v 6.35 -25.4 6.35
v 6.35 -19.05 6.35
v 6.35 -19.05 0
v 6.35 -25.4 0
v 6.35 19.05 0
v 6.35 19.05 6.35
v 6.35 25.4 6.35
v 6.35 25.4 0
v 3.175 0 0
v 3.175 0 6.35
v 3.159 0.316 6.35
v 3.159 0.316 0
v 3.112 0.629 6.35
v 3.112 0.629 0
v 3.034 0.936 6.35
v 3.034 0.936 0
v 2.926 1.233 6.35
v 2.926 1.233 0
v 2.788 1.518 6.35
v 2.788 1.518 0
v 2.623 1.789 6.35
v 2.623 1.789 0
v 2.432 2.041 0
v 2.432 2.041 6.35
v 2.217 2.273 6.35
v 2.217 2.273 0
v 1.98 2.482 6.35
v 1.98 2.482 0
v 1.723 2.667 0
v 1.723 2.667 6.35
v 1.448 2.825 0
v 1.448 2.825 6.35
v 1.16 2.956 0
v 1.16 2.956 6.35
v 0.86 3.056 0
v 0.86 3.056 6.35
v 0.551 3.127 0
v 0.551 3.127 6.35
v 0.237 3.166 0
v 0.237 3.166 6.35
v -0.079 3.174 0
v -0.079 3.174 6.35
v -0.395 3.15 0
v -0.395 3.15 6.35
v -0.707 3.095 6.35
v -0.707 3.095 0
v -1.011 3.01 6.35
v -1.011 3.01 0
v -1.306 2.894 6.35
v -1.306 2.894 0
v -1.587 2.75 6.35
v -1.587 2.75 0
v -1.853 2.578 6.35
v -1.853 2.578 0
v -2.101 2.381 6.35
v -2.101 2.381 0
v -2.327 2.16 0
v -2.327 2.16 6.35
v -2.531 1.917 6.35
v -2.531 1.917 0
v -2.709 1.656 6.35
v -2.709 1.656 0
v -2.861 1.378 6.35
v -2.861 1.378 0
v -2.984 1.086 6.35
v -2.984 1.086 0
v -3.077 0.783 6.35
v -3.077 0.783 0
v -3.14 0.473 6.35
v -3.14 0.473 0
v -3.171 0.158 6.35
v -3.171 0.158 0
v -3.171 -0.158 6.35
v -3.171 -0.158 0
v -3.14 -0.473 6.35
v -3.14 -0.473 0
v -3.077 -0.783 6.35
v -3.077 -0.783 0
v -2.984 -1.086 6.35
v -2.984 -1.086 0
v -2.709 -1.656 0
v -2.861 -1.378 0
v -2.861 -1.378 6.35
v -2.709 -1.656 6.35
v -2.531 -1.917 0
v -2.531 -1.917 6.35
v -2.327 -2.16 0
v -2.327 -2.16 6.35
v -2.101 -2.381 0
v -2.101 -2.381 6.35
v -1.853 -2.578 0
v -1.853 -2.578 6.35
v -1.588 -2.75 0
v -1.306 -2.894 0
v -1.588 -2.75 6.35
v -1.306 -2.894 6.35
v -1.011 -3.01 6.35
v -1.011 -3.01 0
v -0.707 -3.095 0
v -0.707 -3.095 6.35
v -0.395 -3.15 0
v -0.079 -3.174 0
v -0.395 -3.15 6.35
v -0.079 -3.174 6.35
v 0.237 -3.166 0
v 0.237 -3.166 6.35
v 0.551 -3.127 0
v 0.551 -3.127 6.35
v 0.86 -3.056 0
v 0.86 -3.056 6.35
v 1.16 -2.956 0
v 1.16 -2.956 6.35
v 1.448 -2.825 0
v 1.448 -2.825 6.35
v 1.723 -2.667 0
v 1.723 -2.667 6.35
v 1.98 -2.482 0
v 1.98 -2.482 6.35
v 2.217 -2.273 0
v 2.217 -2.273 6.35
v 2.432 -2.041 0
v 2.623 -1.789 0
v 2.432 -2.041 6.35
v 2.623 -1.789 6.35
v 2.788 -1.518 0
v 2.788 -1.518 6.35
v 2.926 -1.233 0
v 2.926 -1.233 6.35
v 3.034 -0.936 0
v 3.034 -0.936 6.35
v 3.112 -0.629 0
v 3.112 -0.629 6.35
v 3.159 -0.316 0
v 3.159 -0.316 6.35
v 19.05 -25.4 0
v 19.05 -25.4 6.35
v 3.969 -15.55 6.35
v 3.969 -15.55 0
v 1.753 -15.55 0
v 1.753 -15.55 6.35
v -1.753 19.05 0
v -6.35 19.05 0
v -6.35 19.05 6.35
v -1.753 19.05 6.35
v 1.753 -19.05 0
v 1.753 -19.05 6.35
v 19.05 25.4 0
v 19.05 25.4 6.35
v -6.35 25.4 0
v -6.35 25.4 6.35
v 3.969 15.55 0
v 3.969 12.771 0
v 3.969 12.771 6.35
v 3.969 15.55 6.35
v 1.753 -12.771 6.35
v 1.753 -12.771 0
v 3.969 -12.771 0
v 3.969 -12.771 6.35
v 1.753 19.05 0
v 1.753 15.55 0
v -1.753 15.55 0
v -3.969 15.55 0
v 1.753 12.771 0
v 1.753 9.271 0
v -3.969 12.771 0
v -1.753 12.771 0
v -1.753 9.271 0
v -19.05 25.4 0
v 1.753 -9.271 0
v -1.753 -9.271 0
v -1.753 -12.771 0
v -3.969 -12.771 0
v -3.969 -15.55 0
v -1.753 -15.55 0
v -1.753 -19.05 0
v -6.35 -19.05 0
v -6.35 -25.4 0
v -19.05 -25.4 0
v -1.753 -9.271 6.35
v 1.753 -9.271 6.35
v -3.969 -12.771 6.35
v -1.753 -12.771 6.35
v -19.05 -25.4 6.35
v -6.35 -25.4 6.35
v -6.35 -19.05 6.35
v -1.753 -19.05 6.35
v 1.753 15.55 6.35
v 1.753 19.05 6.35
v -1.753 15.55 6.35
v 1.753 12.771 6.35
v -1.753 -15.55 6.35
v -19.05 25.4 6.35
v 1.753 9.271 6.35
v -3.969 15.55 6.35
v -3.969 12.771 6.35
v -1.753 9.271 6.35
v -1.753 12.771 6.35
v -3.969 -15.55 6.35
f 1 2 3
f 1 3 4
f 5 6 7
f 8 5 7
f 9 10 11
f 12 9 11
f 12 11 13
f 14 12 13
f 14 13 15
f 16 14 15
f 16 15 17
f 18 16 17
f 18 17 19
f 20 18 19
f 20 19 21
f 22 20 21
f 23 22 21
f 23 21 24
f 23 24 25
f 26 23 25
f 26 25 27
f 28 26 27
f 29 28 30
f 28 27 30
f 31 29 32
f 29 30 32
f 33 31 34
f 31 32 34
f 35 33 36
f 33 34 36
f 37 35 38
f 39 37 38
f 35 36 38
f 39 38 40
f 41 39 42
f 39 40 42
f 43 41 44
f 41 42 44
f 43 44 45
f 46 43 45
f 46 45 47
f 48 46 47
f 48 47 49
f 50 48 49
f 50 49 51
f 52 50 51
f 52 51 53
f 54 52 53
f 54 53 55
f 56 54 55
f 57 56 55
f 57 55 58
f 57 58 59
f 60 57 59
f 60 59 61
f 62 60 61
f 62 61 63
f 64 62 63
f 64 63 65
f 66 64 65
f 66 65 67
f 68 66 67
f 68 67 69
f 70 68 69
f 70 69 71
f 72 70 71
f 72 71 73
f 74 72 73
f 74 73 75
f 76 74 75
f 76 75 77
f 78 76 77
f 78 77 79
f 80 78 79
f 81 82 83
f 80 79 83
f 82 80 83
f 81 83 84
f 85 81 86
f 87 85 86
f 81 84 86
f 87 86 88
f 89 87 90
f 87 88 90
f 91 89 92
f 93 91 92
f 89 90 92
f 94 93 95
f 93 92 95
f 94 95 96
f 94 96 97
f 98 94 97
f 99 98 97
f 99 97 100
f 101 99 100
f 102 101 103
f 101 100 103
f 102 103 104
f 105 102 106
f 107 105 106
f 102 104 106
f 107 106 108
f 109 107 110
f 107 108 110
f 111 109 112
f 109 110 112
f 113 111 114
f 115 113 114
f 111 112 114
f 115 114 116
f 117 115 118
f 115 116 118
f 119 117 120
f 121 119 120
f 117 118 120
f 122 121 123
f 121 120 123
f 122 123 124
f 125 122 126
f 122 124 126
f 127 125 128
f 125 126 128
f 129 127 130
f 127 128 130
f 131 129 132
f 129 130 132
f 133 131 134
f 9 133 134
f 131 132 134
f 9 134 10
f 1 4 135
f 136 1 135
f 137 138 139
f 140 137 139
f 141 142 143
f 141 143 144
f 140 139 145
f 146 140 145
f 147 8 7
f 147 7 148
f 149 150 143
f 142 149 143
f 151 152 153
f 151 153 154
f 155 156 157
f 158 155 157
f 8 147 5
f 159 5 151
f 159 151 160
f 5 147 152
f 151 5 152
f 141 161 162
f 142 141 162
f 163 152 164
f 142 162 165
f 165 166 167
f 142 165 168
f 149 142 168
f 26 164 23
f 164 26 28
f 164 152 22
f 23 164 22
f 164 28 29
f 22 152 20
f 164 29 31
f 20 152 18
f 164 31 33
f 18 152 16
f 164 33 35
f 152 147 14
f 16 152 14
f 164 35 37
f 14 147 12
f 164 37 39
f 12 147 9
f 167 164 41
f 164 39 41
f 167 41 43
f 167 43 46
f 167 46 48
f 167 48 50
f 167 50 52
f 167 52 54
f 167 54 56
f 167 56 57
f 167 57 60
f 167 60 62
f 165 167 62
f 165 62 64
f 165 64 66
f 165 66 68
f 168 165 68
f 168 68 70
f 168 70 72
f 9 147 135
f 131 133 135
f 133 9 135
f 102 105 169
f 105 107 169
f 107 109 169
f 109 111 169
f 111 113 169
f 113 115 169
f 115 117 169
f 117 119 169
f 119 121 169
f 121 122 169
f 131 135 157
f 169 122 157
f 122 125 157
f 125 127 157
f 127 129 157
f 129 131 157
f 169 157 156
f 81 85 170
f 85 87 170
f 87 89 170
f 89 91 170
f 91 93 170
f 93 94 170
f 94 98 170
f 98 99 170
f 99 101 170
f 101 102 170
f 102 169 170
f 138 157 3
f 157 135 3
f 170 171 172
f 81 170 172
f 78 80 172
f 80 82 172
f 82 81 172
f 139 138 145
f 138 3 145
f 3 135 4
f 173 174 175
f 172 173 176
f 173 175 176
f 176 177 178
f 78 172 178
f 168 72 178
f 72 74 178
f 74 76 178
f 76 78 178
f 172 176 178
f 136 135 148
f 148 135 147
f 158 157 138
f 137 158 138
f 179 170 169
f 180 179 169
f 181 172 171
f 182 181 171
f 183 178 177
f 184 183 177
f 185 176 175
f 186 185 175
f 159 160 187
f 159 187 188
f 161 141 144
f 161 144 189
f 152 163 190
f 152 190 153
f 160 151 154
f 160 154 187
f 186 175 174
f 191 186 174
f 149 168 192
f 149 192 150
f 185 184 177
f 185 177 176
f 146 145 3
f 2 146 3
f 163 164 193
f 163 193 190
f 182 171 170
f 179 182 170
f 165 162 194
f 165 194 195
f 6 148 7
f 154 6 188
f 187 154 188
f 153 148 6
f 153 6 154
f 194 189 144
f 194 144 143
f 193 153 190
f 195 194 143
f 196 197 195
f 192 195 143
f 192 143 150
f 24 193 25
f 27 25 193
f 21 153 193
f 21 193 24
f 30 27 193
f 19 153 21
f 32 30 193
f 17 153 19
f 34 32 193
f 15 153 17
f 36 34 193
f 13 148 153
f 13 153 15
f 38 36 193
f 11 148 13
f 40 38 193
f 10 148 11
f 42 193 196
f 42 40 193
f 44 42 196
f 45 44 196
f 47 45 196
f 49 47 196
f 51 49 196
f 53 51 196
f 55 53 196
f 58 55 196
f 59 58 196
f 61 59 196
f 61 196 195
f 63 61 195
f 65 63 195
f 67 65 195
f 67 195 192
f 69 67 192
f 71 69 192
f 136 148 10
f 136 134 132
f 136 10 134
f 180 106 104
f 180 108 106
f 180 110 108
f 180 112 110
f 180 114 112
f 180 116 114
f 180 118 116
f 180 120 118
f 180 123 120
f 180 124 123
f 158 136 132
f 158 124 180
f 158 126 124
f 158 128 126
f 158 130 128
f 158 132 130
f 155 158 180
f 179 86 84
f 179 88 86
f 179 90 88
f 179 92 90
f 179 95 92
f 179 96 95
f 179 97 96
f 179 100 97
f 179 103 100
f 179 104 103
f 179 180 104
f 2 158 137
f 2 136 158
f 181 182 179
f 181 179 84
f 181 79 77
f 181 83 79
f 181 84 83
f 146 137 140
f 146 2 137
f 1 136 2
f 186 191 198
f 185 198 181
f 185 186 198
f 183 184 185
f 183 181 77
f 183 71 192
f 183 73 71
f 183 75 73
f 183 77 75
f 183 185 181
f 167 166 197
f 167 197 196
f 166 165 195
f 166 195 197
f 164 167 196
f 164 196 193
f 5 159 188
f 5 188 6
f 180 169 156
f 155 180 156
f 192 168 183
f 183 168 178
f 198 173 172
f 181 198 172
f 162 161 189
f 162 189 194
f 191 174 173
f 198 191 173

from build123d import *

# Parameters (mm, degrees)
BOSS_EXTRUDE1_DEPTH = 6.35
SKETCH3_R           = 3.175
CUT_EXTRUDE1_DEPTH  = 33.378773911


with BuildPart() as part:
    # Sketch2 → Boss-Extrude1 (new body)
    with BuildSketch(Plane.XY):
        Polygon((-19.05, 0), (-19.05, 25.4), (-6.35, 25.4), (-6.35, 19.05), (-1.7526, 19.05), (-1.7526, 15.5495625), (-3.96875, 15.5495625), (-3.96875, 12.7714375), (-1.7526, 12.7714375), (-1.7526, 9.271), (1.7526, 9.271), (1.7526, 12.7714375), (3.96875, 12.7714375), (3.96875, 15.5495625), (1.7526, 15.5495625), (1.7526, 19.05), (6.35, 19.05), (6.35, 25.4), (19.05, 25.4), (19.05, 0), align=None)
    boss_extrude1 = extrude(amount=BOSS_EXTRUDE1_DEPTH)

    # Mirror1: Boss-Extrude1 across plane
    add(boss_extrude1.mirror(Plane(origin=(-19.05, 0, 6.35), x_dir=(0, 0, 1), z_dir=(0, 1, 0))))

    # Sketch3 → Cut-Extrude1 (cut, through all)
    with BuildSketch(Plane.XY.offset(6.35)):
        Circle(SKETCH3_R)
    extrude(amount=-CUT_EXTRUDE1_DEPTH, mode=Mode.SUBTRACT)


solid = part.part
